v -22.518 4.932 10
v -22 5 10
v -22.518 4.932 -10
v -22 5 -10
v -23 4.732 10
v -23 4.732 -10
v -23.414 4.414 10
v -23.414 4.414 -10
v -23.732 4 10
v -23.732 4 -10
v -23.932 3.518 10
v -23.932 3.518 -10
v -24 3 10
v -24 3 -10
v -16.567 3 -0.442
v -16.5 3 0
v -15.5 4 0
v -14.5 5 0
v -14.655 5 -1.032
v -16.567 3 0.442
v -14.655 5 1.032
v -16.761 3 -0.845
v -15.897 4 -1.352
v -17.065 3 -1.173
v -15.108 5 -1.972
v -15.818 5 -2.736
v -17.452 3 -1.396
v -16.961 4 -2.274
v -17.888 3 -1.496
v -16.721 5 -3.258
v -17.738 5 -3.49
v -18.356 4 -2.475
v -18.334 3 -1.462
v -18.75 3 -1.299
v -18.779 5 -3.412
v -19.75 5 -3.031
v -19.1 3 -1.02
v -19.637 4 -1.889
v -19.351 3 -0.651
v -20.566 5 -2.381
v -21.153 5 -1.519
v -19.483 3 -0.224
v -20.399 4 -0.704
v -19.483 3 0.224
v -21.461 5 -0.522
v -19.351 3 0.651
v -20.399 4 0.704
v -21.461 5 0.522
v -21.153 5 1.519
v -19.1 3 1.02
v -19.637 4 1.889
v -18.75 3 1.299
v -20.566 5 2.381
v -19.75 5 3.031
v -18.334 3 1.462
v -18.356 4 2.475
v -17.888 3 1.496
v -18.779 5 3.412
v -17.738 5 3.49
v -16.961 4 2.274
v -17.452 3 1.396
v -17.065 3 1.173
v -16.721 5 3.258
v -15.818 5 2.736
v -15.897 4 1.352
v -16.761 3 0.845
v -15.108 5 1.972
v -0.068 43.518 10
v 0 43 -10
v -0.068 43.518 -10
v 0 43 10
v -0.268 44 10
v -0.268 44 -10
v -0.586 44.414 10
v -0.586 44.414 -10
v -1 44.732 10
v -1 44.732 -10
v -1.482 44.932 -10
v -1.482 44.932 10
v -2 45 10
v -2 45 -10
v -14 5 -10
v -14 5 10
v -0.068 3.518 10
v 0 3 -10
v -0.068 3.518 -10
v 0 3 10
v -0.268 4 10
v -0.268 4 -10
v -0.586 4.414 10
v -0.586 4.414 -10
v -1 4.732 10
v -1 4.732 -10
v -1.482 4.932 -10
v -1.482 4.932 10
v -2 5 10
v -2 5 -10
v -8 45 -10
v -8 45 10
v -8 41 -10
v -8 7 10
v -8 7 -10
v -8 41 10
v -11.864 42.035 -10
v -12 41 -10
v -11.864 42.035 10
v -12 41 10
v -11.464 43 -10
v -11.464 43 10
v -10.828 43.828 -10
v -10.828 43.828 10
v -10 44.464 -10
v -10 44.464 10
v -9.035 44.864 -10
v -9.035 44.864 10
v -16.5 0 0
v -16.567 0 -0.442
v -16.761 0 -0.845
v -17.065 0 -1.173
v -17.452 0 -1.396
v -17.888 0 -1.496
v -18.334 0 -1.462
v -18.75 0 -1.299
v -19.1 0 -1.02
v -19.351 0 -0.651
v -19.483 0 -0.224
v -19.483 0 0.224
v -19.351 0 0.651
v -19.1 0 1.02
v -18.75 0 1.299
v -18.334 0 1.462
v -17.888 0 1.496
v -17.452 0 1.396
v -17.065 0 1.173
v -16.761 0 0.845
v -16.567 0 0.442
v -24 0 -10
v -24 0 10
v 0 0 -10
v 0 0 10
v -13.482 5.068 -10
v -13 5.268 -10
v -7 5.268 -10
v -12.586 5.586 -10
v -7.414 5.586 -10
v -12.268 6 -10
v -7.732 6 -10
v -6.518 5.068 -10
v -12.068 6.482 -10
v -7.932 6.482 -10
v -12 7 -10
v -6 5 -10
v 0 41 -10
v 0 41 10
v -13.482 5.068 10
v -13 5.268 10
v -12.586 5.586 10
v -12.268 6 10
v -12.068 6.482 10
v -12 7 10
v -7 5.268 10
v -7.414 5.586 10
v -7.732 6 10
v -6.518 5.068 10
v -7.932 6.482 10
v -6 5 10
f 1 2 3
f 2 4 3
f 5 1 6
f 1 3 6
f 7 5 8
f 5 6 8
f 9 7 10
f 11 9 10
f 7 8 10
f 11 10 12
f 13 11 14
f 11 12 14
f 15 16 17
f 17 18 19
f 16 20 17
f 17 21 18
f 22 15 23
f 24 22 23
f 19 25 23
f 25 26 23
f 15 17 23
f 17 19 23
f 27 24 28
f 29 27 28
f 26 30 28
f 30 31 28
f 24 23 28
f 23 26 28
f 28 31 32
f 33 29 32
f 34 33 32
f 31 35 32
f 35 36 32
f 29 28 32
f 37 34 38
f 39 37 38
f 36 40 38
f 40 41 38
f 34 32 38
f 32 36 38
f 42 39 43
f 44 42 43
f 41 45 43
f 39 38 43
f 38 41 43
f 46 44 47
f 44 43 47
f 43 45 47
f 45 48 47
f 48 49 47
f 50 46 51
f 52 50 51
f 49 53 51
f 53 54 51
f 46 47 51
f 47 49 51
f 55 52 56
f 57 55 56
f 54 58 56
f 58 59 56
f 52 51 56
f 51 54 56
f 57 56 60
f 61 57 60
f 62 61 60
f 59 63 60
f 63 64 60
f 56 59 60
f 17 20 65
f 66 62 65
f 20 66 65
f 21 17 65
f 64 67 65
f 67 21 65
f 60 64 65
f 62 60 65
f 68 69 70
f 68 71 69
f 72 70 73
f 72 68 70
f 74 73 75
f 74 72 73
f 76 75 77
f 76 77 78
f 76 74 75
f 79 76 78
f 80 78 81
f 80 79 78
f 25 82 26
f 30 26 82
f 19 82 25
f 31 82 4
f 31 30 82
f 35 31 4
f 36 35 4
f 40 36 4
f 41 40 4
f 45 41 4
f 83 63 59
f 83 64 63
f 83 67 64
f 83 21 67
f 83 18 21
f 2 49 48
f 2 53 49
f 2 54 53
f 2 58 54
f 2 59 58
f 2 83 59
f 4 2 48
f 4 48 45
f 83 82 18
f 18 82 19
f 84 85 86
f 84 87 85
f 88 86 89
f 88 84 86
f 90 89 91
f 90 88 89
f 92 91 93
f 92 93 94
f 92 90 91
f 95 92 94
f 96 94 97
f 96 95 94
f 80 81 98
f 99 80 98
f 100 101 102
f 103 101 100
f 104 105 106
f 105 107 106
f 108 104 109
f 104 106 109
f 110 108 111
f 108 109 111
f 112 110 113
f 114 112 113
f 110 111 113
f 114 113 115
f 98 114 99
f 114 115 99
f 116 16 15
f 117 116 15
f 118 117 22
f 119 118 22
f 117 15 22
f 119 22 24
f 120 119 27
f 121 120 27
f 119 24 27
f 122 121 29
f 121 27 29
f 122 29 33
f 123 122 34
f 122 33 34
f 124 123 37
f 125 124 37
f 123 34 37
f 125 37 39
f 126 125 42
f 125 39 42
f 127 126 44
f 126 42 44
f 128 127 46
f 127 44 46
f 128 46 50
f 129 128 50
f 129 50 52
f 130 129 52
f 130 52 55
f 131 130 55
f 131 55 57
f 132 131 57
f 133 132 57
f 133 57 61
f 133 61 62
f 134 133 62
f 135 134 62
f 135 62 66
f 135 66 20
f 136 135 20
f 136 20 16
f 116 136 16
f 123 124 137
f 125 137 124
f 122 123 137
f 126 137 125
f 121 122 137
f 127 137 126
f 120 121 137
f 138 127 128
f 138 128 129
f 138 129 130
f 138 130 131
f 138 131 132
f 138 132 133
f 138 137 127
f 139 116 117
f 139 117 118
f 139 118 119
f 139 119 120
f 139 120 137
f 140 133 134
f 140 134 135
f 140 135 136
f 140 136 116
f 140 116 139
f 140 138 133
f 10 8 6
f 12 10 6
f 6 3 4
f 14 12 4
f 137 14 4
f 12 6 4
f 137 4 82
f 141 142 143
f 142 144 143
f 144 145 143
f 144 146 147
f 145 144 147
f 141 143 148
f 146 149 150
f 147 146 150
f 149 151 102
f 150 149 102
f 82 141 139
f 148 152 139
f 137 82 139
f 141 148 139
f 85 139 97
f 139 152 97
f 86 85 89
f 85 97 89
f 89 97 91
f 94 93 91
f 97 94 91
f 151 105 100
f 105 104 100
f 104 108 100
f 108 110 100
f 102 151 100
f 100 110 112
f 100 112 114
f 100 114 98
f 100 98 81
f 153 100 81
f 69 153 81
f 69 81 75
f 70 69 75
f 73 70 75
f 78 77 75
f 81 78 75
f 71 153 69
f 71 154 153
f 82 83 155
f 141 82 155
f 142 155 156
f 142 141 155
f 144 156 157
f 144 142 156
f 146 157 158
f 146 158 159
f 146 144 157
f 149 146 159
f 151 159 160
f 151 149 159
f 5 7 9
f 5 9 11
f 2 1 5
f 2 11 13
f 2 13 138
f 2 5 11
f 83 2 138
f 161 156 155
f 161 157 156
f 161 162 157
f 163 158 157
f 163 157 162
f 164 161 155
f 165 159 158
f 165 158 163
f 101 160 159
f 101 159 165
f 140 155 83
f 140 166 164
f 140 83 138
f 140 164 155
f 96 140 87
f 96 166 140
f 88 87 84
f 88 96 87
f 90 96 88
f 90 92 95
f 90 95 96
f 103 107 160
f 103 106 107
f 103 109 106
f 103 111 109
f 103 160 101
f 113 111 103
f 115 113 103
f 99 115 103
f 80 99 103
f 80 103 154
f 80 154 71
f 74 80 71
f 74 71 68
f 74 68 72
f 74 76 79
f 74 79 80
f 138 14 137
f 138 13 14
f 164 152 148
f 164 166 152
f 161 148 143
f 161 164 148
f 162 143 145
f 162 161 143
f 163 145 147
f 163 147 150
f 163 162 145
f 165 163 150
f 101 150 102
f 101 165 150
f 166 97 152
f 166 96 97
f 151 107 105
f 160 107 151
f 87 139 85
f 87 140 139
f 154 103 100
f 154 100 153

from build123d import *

# Parameters (mm, degrees)
AUFSATZ_LINEAR_AUSTRAGEN1_DEPTH = 10
SKIZZE2_R                       = 1.5
SCHNITT_LINEAR_AUSTRAGEN1_DEPTH = 6
FASE1_SIZE                      = 2
VERRUNDUNG1_R                   = 2
VERRUNDUNG2_R                   = 4


with BuildPart() as part:
    # Skizze1 → Aufsatz-Linear austragen1 (new body, symmetric)
    with BuildSketch(Plane.XY):
        Polygon((-24, 0), (0, 0), (0, 5), (-8, 5), (-8, 41), (0, 41), (0, 45), (-12, 45), (-12, 5), (-24, 5), align=None)
    extrude(amount=AUFSATZ_LINEAR_AUSTRAGEN1_DEPTH, both=True)

    # Skizze2 → Schnitt-Linear austragen1 (cut, through all)
    with BuildSketch(Plane(origin=(0, 5, 0), x_dir=(1, 0, 0), z_dir=(0, 1, 0))):
        with Locations((-18, 0)):
            Circle(SKIZZE2_R)
    extrude(amount=-SCHNITT_LINEAR_AUSTRAGEN1_DEPTH, mode=Mode.SUBTRACT)

    # Fase1
    fase1_edges = [part.edges().sort_by_distance(p)[0] for p in [
        (-19.5, 5, 0),
    ]]
    chamfer(fase1_edges, length=FASE1_SIZE)

    # Verrundung1
    verrundung1_edges = [part.edges().sort_by_distance(p)[0] for p in [
        (-24, 5, 0),
        (-12, 5, 0),
        (0, 45, 0),
        (-8, 5, 0),
        (0, 5, 0),
    ]]
    fillet(verrundung1_edges, radius=VERRUNDUNG1_R)

    # Verrundung2
    verrundung2_edges = [part.edges().sort_by_distance(p)[0] for p in [
        (-12, 45, 0),
    ]]
    fillet(verrundung2_edges, radius=VERRUNDUNG2_R)


solid = part.part
